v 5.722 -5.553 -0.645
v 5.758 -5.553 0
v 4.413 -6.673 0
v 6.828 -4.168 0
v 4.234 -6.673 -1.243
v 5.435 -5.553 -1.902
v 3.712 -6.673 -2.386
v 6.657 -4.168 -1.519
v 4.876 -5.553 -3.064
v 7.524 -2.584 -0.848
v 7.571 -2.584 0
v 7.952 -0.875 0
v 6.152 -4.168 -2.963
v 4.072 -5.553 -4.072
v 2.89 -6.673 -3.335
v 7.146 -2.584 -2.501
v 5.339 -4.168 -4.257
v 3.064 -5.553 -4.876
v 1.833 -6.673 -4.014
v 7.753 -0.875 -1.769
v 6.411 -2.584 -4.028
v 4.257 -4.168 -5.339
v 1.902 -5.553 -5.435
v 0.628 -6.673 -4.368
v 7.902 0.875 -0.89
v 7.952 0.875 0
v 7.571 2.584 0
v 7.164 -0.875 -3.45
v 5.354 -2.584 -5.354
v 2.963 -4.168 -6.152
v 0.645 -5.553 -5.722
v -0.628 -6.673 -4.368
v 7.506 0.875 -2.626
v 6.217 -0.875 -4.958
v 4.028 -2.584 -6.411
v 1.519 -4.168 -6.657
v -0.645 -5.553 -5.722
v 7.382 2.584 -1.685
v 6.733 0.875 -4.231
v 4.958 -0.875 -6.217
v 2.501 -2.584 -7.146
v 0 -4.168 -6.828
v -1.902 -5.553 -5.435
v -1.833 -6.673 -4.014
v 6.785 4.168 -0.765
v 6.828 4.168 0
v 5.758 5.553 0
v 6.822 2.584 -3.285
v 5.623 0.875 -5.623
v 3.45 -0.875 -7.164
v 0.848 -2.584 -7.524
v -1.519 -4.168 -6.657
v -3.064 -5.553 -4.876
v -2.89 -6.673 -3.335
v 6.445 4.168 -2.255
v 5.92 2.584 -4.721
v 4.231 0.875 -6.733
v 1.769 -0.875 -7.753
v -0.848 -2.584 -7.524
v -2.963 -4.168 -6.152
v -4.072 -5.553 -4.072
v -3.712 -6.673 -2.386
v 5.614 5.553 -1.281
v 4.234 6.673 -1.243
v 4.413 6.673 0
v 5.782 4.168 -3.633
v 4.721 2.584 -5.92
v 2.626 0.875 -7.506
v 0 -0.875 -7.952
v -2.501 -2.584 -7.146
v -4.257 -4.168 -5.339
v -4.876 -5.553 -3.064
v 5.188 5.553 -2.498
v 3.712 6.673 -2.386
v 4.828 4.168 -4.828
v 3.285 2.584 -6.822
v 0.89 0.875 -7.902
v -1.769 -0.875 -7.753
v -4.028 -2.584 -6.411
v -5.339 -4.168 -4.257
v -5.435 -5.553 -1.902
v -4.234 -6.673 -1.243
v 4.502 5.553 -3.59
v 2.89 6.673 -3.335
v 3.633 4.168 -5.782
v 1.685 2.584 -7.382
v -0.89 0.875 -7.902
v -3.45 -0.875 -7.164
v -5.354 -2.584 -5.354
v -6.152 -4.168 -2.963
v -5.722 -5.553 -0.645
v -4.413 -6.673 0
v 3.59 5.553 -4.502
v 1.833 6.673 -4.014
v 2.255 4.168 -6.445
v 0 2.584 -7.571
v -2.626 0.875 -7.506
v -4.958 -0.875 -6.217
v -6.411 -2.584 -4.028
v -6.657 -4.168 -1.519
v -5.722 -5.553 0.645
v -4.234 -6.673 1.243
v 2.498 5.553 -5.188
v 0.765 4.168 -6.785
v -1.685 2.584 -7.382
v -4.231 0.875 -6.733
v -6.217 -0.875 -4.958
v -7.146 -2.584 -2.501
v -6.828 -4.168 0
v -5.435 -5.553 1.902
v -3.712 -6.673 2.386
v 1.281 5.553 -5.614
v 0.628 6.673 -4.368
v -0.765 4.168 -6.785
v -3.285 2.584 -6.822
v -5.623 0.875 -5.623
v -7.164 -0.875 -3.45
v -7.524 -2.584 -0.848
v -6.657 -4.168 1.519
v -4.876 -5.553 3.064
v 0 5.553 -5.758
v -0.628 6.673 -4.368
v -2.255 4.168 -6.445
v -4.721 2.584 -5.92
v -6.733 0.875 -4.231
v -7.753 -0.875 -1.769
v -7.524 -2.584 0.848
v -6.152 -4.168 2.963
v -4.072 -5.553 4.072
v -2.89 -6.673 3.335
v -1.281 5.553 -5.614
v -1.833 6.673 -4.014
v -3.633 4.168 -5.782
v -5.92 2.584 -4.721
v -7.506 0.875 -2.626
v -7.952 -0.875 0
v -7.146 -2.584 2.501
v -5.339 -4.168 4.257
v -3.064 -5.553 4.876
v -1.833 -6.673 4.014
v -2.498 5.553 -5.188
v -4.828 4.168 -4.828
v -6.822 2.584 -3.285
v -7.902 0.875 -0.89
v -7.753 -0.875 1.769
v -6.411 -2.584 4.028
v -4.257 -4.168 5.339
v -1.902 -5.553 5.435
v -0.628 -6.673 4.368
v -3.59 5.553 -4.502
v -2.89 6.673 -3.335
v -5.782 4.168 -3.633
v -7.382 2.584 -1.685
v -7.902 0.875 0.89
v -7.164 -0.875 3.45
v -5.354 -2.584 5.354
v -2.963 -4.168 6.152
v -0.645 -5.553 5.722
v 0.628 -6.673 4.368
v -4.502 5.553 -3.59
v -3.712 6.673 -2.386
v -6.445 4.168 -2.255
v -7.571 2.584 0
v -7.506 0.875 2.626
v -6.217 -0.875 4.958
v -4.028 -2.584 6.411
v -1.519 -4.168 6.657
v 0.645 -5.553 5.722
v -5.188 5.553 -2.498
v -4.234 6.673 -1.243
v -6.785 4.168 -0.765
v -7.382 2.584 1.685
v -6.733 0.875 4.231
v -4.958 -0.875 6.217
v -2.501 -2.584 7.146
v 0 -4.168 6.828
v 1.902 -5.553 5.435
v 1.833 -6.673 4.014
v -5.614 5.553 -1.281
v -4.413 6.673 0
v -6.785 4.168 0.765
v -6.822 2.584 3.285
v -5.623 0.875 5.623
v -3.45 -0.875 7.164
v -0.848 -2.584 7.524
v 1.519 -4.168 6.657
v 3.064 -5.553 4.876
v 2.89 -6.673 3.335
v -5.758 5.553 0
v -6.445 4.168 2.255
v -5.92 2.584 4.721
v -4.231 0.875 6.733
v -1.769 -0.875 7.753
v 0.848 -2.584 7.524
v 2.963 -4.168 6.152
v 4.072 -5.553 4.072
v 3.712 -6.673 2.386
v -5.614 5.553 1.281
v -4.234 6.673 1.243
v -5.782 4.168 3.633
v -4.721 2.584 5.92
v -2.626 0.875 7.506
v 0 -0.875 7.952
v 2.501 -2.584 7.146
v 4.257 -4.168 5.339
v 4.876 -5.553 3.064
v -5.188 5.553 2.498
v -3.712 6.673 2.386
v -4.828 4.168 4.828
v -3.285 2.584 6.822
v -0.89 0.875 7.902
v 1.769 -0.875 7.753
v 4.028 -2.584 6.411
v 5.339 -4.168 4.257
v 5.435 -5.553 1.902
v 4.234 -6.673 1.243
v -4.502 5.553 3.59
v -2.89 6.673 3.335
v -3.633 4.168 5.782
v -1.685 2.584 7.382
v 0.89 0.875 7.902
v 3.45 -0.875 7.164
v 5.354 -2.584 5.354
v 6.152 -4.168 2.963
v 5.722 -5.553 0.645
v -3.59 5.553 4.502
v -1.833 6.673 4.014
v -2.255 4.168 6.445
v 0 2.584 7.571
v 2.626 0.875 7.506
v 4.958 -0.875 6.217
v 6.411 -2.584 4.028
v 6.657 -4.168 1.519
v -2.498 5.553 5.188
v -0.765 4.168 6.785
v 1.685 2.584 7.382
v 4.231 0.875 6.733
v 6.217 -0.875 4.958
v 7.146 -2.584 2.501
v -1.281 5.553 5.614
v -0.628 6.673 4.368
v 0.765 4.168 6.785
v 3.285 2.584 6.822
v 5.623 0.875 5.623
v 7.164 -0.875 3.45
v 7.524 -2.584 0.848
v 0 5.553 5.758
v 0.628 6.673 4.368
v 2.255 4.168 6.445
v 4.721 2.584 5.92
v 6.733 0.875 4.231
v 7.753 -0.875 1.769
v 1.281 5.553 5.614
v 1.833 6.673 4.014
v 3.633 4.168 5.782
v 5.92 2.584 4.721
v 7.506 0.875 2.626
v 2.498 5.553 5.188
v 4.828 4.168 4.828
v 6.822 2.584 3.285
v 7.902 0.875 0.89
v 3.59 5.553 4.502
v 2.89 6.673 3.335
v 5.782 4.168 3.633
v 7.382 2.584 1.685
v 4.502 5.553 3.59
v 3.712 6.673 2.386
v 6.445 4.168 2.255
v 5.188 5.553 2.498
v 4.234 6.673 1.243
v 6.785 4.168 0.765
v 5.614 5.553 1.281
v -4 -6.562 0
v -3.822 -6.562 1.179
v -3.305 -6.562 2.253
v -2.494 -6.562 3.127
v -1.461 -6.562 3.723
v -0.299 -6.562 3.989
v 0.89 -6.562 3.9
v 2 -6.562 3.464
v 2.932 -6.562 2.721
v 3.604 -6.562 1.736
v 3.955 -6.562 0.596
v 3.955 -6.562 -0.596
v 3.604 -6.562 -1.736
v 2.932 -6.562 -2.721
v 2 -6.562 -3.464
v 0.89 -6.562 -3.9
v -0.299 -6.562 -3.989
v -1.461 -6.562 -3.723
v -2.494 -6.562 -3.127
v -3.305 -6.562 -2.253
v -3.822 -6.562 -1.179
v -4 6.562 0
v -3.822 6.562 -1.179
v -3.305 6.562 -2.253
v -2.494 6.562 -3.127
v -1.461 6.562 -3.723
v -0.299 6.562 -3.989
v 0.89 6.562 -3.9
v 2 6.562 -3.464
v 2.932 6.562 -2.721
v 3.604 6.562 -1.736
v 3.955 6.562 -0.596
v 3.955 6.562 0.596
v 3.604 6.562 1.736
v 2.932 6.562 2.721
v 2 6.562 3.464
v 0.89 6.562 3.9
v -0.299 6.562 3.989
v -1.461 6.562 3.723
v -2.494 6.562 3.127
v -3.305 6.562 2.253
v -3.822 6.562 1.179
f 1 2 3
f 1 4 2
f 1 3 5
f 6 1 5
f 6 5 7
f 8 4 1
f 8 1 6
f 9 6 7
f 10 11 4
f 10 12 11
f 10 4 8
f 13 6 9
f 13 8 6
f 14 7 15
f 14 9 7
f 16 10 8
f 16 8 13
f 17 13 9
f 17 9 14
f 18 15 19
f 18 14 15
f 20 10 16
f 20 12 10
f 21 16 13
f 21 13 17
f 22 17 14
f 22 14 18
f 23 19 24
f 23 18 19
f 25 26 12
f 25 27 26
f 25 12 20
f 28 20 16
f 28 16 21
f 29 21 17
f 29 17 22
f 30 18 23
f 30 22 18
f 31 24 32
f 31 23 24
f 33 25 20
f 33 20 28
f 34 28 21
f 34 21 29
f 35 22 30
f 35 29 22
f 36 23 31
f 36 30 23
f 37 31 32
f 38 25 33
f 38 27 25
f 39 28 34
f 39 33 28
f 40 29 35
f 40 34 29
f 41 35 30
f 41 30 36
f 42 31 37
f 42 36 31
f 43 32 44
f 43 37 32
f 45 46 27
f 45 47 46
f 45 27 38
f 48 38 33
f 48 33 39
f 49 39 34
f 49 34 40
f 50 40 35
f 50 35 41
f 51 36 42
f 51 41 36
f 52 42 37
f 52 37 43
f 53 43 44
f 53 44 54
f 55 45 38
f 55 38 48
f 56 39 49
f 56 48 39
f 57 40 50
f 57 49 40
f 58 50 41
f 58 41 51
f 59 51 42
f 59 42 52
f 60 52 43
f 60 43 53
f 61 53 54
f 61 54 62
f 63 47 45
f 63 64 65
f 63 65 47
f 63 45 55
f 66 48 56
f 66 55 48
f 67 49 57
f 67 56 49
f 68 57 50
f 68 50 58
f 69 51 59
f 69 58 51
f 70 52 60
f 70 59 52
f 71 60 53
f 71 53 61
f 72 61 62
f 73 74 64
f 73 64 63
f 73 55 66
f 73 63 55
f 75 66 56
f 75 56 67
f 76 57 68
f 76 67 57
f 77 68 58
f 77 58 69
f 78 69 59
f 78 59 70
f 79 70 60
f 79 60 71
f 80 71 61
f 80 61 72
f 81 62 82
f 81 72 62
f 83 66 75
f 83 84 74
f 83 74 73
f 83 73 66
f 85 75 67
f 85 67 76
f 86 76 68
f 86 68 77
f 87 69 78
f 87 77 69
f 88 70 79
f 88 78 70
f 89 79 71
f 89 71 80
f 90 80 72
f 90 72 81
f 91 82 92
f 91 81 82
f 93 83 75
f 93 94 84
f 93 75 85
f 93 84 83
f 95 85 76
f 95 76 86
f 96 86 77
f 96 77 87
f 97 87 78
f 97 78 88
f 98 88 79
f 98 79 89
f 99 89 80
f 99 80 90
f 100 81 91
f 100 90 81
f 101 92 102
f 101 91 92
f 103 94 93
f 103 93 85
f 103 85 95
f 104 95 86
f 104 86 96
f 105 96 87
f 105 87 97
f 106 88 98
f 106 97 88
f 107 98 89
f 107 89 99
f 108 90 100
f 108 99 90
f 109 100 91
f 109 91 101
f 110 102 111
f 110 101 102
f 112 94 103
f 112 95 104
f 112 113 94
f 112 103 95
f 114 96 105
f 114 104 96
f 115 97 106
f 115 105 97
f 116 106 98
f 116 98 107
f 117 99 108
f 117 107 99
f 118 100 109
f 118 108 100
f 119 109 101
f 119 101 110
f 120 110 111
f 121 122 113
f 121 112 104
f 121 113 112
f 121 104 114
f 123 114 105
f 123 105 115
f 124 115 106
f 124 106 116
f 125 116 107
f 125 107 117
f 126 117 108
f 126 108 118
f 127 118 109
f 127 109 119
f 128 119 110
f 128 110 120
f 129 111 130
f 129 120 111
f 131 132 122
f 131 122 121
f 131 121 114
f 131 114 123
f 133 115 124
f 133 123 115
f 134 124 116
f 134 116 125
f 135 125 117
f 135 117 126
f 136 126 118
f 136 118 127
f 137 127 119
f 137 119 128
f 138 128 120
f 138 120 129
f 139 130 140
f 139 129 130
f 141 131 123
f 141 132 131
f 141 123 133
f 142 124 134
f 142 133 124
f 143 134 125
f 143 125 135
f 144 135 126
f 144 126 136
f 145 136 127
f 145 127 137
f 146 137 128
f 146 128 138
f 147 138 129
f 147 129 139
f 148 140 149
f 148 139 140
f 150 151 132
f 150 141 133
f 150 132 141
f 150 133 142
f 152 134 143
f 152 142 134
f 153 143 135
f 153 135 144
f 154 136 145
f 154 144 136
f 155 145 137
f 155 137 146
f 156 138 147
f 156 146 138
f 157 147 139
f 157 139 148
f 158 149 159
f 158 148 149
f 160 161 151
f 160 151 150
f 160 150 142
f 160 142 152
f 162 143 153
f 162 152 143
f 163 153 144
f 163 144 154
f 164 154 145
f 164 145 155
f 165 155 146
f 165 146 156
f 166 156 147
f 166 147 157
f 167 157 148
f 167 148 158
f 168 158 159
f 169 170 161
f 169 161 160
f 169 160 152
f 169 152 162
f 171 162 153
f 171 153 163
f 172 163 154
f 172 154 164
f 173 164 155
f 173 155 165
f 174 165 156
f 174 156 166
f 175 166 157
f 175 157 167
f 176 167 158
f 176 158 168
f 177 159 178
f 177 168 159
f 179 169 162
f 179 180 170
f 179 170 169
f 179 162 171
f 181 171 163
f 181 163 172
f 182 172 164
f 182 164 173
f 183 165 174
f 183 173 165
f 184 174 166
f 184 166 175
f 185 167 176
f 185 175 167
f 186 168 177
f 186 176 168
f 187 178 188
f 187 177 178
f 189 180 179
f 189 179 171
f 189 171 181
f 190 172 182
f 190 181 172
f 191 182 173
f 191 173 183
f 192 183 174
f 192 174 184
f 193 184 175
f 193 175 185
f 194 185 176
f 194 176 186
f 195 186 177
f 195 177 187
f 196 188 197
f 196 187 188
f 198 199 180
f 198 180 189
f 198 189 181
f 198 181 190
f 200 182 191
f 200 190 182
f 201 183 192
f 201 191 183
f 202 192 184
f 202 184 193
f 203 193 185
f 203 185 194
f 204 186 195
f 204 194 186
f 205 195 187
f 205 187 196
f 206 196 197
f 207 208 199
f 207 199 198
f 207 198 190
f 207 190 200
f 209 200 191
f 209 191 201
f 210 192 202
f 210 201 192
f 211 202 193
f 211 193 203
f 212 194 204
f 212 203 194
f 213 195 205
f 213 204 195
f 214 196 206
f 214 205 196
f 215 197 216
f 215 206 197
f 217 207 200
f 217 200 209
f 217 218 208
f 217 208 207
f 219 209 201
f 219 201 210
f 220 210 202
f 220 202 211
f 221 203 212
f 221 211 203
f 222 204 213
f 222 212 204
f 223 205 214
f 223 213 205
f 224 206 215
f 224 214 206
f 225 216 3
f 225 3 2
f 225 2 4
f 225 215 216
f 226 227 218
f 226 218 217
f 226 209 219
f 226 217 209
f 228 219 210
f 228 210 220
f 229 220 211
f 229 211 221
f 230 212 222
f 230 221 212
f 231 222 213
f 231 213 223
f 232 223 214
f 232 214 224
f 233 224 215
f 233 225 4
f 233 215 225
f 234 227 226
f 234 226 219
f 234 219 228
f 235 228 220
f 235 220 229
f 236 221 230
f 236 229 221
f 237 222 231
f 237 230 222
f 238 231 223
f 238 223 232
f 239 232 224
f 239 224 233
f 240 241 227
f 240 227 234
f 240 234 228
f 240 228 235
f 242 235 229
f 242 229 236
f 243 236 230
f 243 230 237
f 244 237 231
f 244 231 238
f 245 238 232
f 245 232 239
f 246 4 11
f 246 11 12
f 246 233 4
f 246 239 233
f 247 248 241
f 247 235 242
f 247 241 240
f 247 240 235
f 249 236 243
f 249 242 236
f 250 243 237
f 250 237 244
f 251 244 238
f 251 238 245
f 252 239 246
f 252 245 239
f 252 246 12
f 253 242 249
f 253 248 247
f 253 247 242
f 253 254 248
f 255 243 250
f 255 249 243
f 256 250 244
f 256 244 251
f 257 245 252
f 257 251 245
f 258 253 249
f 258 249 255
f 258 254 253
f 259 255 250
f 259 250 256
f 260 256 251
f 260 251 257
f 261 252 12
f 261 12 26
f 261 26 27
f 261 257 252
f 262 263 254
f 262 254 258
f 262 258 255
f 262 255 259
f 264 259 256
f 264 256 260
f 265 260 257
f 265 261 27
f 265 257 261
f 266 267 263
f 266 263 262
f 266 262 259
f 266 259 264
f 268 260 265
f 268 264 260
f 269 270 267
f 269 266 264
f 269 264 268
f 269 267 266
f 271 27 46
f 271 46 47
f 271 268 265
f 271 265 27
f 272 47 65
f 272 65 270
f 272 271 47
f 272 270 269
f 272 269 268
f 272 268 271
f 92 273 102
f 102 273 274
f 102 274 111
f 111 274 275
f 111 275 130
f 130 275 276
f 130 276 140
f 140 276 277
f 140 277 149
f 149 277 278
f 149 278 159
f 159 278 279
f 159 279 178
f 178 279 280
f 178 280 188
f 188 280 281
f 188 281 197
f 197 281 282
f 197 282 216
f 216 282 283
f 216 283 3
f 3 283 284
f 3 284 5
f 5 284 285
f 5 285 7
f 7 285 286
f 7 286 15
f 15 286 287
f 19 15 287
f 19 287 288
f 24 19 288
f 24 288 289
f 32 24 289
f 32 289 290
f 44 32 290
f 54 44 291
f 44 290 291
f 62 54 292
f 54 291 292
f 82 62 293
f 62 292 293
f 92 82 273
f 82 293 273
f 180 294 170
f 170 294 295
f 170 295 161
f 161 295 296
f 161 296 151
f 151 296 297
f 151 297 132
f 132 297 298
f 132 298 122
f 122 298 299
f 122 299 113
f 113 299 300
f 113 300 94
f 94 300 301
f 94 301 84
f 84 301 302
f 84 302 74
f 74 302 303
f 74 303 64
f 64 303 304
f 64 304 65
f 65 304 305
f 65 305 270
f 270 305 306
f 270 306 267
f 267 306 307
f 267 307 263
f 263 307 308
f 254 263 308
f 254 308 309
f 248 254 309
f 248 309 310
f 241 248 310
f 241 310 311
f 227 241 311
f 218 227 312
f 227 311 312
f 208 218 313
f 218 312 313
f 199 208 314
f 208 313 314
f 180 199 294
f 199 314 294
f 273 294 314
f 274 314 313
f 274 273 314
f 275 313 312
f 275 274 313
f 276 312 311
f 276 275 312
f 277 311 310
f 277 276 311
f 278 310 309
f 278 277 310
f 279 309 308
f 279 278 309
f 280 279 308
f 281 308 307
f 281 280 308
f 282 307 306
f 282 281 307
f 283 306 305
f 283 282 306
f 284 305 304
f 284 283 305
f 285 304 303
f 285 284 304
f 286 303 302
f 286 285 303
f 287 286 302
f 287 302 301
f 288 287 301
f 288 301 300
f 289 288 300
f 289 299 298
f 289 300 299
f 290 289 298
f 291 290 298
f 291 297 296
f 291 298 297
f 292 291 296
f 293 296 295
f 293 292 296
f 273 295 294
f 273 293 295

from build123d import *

# Parameters (mm, degrees)
CORTAR_EXTRUIR1_DEPTH      = 10
CORTAR_EXTRUIR1_DEPTH_BACK = 10
CROQUIS3_R                 = 4
CHAFL_N1_SIZE              = 0.366025404


with BuildPart() as part:
    # Croquis1 → Revolución1 (revolve)
    with BuildSketch(Plane.XY):
        with BuildLine():
            Line((0, 0), (0, -8))
            ThreePointArc((0, -8), (8, 0), (0, 8))
            Line((0, 8), (0, 0))
        make_face()
    revolve(axis=Axis((0, -8, 0), (0, 1, 0)))

    # Croquis3 → Cortar-Extruir1 (cut, two sides: drawn at the far end of the back side and taken through both)
    with BuildSketch(Plane(origin=(0, 0, 0), x_dir=(1, 0, 0), z_dir=(0, 1, 0)).offset(-CORTAR_EXTRUIR1_DEPTH_BACK)):
        with Locations(Location((0, 0, 0), (0, 0, 180))):
            Circle(CROQUIS3_R)
    extrude(amount=CORTAR_EXTRUIR1_DEPTH + CORTAR_EXTRUIR1_DEPTH_BACK, mode=Mode.SUBTRACT)

    # Chaflán1
    # the kernel refuses this chamfer: 0.5, 0.366025404 mm, written as the material it takes off along each edge
    with BuildSketch(Plane(origin=(0, -6.92820323, 0), x_dir=(-1, 0, 0), z_dir=(0, 0, -1))) as chafl_n1_piece_1:
        with BuildLine():
            Line((4.412889217, 0.255392072), (4, CHAFL_N1_SIZE))
            Line((4, CHAFL_N1_SIZE), (4, 0))
            ThreePointArc((4, 0), (4.214206629, 0.128169224), (4.412889217, 0.255392072))
        make_face()
    revolve(axis=Axis((0, -6.92820323, 0), (0, 1, 0)), revolution_arc=180, mode=Mode.SUBTRACT)
    with BuildSketch(Plane(origin=(0, 6.92820323, 0), x_dir=(-1, 0, 0), z_dir=(0, 0, 1))) as chafl_n1_piece_2:
        with BuildLine():
            Line((4.412889217, 0.255392072), (4, CHAFL_N1_SIZE))
            Line((4, CHAFL_N1_SIZE), (4, 0))
            ThreePointArc((4, 0), (4.214206629, 0.128169224), (4.412889217, 0.255392072))
        make_face()
    revolve(axis=Axis((0, 6.92820323, 0), (0, -1, 0)), revolution_arc=180, mode=Mode.SUBTRACT)
    with BuildSketch(Plane(origin=(0, 6.92820323, 0), x_dir=(1, 0, 0), z_dir=(0, 0, -1))) as chafl_n1_piece_3:
        with BuildLine():
            Line((4.412889217, 0.255392072), (4, CHAFL_N1_SIZE))
            Line((4, CHAFL_N1_SIZE), (4, 0))
            ThreePointArc((4, 0), (4.214206629, 0.128169224), (4.412889217, 0.255392072))
        make_face()
    revolve(axis=Axis((0, 6.92820323, 0), (0, -1, 0)), revolution_arc=180, mode=Mode.SUBTRACT)
    with BuildSketch(Plane(origin=(0, -6.92820323, 0), x_dir=(1, 0, 0), z_dir=(0, 0, 1))) as chafl_n1_piece_4:
        with BuildLine():
            Line((4.412889217, 0.255392072), (4, CHAFL_N1_SIZE))
            Line((4, CHAFL_N1_SIZE), (4, 0))
            ThreePointArc((4, 0), (4.214206629, 0.128169224), (4.412889217, 0.255392072))
        make_face()
    revolve(axis=Axis((0, -6.92820323, 0), (0, 1, 0)), revolution_arc=180, mode=Mode.SUBTRACT)


solid = part.part
